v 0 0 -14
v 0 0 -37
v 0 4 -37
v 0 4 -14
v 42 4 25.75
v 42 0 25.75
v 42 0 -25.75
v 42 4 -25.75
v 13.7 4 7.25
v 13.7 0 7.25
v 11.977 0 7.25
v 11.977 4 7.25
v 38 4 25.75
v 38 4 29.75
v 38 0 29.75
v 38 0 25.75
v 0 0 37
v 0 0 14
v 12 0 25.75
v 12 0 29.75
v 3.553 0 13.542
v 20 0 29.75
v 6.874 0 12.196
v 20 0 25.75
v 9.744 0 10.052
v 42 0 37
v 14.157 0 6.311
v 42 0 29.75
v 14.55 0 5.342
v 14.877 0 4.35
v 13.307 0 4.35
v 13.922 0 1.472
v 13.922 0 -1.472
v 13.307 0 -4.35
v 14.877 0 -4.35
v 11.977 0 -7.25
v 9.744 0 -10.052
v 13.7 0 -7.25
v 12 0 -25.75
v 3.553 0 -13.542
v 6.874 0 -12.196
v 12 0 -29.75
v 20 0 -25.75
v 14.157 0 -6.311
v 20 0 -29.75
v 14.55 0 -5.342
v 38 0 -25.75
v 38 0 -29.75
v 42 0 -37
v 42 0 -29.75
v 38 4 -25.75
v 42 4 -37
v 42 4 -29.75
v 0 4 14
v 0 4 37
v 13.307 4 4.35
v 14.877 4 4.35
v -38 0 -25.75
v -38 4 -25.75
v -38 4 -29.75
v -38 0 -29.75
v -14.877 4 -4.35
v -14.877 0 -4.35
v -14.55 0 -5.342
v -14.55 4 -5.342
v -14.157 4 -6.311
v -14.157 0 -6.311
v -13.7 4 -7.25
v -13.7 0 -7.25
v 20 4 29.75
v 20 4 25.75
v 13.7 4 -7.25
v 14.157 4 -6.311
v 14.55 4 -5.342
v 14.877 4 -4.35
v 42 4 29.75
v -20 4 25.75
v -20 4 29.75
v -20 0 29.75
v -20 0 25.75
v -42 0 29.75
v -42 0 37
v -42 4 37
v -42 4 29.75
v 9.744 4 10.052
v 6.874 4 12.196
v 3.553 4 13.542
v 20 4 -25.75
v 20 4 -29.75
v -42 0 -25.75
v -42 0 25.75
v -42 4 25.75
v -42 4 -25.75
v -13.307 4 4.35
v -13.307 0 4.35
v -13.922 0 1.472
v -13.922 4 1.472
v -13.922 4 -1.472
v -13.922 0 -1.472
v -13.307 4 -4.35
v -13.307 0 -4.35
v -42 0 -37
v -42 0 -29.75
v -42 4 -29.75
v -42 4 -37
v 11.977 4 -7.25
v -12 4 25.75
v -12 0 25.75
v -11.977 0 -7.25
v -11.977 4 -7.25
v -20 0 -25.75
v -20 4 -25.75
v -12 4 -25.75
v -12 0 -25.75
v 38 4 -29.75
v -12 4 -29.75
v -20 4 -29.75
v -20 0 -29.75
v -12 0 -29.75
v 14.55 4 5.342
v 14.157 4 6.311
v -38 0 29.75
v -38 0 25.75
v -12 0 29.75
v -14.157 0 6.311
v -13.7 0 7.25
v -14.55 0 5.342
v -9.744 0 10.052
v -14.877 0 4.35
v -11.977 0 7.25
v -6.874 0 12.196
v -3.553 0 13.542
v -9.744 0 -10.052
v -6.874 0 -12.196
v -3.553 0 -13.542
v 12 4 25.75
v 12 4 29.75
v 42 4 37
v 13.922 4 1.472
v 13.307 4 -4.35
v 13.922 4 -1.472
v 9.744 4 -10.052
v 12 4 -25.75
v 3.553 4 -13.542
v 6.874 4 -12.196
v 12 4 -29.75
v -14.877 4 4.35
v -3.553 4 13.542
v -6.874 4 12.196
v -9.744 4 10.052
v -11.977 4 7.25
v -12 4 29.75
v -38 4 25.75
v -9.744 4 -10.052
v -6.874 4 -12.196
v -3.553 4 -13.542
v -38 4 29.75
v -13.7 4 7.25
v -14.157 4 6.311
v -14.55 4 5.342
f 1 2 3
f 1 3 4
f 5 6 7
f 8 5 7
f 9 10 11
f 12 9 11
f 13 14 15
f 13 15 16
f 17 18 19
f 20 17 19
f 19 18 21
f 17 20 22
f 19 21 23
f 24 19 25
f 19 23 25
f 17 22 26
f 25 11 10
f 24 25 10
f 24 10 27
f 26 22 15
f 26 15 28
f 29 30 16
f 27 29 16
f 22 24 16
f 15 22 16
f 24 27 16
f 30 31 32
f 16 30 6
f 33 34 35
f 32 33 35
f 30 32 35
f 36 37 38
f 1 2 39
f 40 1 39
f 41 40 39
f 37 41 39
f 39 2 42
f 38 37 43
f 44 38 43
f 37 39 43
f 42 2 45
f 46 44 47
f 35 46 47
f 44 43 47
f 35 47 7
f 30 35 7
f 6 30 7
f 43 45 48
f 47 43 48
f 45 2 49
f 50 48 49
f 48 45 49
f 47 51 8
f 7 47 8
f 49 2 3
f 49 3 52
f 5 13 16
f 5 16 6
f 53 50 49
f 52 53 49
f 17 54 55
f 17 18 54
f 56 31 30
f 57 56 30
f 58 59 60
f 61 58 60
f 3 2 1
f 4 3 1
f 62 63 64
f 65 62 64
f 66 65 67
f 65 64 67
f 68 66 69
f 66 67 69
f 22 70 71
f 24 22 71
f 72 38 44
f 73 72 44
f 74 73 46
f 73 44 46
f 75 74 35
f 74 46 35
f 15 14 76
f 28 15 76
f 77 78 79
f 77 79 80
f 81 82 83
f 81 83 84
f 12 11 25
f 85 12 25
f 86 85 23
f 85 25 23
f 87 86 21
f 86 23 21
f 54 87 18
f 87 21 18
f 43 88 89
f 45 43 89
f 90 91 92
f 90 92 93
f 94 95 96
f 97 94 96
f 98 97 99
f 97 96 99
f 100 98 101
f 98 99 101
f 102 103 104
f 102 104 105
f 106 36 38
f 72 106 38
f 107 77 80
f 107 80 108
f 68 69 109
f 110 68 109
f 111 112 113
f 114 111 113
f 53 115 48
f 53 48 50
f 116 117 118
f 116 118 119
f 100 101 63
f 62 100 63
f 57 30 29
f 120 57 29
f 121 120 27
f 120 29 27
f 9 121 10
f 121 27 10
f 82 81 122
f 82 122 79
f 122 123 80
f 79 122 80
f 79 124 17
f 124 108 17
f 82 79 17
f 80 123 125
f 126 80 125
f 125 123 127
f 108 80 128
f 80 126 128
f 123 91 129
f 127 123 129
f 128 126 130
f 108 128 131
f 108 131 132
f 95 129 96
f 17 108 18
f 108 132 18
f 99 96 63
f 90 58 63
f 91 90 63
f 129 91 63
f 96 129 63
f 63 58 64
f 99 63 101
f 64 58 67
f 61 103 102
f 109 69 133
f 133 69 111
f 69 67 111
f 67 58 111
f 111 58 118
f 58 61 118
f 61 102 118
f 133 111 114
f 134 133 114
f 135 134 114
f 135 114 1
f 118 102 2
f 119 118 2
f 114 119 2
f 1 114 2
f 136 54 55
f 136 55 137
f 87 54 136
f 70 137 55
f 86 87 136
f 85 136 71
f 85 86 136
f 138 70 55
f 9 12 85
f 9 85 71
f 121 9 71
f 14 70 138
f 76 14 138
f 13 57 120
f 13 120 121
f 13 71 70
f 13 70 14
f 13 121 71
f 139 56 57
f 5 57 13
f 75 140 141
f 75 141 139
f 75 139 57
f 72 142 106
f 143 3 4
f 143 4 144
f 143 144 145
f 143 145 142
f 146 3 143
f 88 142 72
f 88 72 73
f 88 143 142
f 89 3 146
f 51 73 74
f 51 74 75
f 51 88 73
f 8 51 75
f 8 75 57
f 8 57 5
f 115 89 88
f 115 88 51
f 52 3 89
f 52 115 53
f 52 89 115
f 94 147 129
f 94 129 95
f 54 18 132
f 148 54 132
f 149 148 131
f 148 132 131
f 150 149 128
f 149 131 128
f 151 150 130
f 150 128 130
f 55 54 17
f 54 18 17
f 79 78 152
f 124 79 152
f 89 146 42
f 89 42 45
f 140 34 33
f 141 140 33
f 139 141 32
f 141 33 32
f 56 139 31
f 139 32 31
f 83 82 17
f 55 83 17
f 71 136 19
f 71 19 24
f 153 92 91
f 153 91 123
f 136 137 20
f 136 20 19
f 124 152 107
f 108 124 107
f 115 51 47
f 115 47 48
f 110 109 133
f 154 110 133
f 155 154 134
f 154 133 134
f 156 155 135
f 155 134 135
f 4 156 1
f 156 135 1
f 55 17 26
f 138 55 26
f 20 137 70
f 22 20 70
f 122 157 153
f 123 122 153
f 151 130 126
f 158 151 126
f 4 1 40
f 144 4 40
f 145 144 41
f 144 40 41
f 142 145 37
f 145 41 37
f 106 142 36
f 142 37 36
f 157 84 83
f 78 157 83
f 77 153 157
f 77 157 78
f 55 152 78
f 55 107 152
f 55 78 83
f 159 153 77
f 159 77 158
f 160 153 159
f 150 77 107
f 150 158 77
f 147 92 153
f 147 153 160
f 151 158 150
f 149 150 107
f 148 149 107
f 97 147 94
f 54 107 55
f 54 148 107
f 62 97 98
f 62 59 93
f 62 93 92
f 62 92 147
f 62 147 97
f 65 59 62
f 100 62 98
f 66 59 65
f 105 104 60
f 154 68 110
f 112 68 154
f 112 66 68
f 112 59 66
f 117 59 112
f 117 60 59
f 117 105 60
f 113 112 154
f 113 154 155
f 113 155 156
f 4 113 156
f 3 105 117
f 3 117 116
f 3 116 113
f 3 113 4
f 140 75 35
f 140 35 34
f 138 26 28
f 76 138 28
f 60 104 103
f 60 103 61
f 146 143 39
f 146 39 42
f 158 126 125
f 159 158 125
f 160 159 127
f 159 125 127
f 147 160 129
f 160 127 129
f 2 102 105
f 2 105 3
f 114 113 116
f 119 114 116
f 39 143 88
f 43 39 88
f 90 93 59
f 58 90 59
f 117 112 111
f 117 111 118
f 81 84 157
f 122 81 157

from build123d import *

# Parameters (mm, degrees)
SKETCH2_W               = 84
SKETCH2_H               = 74
BOSS_EXTRUDE1_DEPTH     = 4
SKETCH4_W               = 8
SKETCH4_H               = 4
SKETCH4_W_2             = 4
CUT_EXTRUDE2_DEPTH      = 1
CUT_EXTRUDE2_DEPTH_BACK = 5


with BuildPart() as part:
    # Sketch2 → Boss-Extrude1 (new body)
    with BuildSketch(Plane(origin=(0, 0, 0), x_dir=(1, 0, 0), z_dir=(0, 1, 0))):
        Rectangle(SKETCH2_W, SKETCH2_H)
        with BuildLine():
            ThreePointArc((13.307047005, 4.35), (14, 0), (13.307047005, -4.35))
            Line((13.307047005, -4.35), (14.877079687, -4.35))
            ThreePointArc((14.877079687, -4.35), (14.361878956, -5.829788405), (13.699908759, -7.25))
            Line((13.699908759, -7.25), (11.976539567, -7.25))
            ThreePointArc((11.976539567, -7.25), (0, -14), (-11.976539567, -7.25))
            Line((-11.976539567, -7.25), (-13.699908759, -7.25))
            ThreePointArc((-13.699908759, -7.25), (-14.361878956, -5.829788405), (-14.877079687, -4.35))
            Line((-14.877079687, -4.35), (-13.307047005, -4.35))
            ThreePointArc((-13.307047005, -4.35), (-14, 0), (-13.307047005, 4.35))
            Line((-13.307047005, 4.35), (-14.877079687, 4.35))
            ThreePointArc((-14.877079687, 4.35), (-14.361878956, 5.829788405), (-13.699908759, 7.25))
            Line((-13.699908759, 7.25), (-11.976539567, 7.25))
            ThreePointArc((-11.976539567, 7.25), (0, 14), (11.976539567, 7.25))
            Line((11.976539567, 7.25), (13.699908759, 7.25))
            ThreePointArc((13.699908759, 7.25), (14.361878956, 5.829788405), (14.877079687, 4.35))
            Line((14.877079687, 4.35), (13.307047005, 4.35))
        make_face(mode=Mode.SUBTRACT)
    extrude(amount=BOSS_EXTRUDE1_DEPTH)


with BuildPart() as body_2:
    # Split1: the piece on the far side of the plane
    add(part.part)
    split(bisect_by=Plane(origin=(0, 0, 0), x_dir=(0, 0, 1), z_dir=(1, 0, 0)), keep=Keep.BOTTOM)


with BuildPart() as part_1:
    add(part.part)

    # Split1
    split(bisect_by=Plane(origin=(0, 0, 0), x_dir=(0, 0, 1), z_dir=(1, 0, 0)), keep=Keep.TOP)


with BuildPart() as cut_extrude2_tool:
    # Sketch4 → Cut-Extrude2 (new body, two sides)
    with BuildSketch(Plane(origin=(0, 4, 0), x_dir=(1, 0, 0), z_dir=(0, 1, 0))) as cut_extrude2_sk:
        with Locations((-16, -27.75)):
            Rectangle(SKETCH4_W, SKETCH4_H)
        with Locations((-40, -27.75)):
            Rectangle(SKETCH4_W_2, SKETCH4_H)
        with Locations((40, -27.75)):
            Rectangle(SKETCH4_W_2, SKETCH4_H)
        with Locations((16, -27.75)):
            Rectangle(SKETCH4_W, SKETCH4_H)
        with Locations((16, 27.75)):
            Rectangle(SKETCH4_W, SKETCH4_H)
        with Locations((40, 27.75)):
            Rectangle(SKETCH4_W_2, SKETCH4_H)
        with Locations((-40, 27.75)):
            Rectangle(SKETCH4_W_2, SKETCH4_H)
        with Locations((-16, 27.75)):
            Rectangle(SKETCH4_W, SKETCH4_H)
    extrude(amount=CUT_EXTRUDE2_DEPTH)
    extrude(cut_extrude2_sk.sketch, amount=-CUT_EXTRUDE2_DEPTH_BACK)


with BuildPart() as part_2:
    add(part_1.part)

    # Cut-Extrude2: cut by cut_extrude2_tool
    add(cut_extrude2_tool.part, mode=Mode.SUBTRACT)


with BuildPart() as body_2_1:
    add(body_2.part)

    # Cut-Extrude2: cut by cut_extrude2_tool
    add(cut_extrude2_tool.part, mode=Mode.SUBTRACT)


solid = Compound([part_2.part, body_2_1.part])
